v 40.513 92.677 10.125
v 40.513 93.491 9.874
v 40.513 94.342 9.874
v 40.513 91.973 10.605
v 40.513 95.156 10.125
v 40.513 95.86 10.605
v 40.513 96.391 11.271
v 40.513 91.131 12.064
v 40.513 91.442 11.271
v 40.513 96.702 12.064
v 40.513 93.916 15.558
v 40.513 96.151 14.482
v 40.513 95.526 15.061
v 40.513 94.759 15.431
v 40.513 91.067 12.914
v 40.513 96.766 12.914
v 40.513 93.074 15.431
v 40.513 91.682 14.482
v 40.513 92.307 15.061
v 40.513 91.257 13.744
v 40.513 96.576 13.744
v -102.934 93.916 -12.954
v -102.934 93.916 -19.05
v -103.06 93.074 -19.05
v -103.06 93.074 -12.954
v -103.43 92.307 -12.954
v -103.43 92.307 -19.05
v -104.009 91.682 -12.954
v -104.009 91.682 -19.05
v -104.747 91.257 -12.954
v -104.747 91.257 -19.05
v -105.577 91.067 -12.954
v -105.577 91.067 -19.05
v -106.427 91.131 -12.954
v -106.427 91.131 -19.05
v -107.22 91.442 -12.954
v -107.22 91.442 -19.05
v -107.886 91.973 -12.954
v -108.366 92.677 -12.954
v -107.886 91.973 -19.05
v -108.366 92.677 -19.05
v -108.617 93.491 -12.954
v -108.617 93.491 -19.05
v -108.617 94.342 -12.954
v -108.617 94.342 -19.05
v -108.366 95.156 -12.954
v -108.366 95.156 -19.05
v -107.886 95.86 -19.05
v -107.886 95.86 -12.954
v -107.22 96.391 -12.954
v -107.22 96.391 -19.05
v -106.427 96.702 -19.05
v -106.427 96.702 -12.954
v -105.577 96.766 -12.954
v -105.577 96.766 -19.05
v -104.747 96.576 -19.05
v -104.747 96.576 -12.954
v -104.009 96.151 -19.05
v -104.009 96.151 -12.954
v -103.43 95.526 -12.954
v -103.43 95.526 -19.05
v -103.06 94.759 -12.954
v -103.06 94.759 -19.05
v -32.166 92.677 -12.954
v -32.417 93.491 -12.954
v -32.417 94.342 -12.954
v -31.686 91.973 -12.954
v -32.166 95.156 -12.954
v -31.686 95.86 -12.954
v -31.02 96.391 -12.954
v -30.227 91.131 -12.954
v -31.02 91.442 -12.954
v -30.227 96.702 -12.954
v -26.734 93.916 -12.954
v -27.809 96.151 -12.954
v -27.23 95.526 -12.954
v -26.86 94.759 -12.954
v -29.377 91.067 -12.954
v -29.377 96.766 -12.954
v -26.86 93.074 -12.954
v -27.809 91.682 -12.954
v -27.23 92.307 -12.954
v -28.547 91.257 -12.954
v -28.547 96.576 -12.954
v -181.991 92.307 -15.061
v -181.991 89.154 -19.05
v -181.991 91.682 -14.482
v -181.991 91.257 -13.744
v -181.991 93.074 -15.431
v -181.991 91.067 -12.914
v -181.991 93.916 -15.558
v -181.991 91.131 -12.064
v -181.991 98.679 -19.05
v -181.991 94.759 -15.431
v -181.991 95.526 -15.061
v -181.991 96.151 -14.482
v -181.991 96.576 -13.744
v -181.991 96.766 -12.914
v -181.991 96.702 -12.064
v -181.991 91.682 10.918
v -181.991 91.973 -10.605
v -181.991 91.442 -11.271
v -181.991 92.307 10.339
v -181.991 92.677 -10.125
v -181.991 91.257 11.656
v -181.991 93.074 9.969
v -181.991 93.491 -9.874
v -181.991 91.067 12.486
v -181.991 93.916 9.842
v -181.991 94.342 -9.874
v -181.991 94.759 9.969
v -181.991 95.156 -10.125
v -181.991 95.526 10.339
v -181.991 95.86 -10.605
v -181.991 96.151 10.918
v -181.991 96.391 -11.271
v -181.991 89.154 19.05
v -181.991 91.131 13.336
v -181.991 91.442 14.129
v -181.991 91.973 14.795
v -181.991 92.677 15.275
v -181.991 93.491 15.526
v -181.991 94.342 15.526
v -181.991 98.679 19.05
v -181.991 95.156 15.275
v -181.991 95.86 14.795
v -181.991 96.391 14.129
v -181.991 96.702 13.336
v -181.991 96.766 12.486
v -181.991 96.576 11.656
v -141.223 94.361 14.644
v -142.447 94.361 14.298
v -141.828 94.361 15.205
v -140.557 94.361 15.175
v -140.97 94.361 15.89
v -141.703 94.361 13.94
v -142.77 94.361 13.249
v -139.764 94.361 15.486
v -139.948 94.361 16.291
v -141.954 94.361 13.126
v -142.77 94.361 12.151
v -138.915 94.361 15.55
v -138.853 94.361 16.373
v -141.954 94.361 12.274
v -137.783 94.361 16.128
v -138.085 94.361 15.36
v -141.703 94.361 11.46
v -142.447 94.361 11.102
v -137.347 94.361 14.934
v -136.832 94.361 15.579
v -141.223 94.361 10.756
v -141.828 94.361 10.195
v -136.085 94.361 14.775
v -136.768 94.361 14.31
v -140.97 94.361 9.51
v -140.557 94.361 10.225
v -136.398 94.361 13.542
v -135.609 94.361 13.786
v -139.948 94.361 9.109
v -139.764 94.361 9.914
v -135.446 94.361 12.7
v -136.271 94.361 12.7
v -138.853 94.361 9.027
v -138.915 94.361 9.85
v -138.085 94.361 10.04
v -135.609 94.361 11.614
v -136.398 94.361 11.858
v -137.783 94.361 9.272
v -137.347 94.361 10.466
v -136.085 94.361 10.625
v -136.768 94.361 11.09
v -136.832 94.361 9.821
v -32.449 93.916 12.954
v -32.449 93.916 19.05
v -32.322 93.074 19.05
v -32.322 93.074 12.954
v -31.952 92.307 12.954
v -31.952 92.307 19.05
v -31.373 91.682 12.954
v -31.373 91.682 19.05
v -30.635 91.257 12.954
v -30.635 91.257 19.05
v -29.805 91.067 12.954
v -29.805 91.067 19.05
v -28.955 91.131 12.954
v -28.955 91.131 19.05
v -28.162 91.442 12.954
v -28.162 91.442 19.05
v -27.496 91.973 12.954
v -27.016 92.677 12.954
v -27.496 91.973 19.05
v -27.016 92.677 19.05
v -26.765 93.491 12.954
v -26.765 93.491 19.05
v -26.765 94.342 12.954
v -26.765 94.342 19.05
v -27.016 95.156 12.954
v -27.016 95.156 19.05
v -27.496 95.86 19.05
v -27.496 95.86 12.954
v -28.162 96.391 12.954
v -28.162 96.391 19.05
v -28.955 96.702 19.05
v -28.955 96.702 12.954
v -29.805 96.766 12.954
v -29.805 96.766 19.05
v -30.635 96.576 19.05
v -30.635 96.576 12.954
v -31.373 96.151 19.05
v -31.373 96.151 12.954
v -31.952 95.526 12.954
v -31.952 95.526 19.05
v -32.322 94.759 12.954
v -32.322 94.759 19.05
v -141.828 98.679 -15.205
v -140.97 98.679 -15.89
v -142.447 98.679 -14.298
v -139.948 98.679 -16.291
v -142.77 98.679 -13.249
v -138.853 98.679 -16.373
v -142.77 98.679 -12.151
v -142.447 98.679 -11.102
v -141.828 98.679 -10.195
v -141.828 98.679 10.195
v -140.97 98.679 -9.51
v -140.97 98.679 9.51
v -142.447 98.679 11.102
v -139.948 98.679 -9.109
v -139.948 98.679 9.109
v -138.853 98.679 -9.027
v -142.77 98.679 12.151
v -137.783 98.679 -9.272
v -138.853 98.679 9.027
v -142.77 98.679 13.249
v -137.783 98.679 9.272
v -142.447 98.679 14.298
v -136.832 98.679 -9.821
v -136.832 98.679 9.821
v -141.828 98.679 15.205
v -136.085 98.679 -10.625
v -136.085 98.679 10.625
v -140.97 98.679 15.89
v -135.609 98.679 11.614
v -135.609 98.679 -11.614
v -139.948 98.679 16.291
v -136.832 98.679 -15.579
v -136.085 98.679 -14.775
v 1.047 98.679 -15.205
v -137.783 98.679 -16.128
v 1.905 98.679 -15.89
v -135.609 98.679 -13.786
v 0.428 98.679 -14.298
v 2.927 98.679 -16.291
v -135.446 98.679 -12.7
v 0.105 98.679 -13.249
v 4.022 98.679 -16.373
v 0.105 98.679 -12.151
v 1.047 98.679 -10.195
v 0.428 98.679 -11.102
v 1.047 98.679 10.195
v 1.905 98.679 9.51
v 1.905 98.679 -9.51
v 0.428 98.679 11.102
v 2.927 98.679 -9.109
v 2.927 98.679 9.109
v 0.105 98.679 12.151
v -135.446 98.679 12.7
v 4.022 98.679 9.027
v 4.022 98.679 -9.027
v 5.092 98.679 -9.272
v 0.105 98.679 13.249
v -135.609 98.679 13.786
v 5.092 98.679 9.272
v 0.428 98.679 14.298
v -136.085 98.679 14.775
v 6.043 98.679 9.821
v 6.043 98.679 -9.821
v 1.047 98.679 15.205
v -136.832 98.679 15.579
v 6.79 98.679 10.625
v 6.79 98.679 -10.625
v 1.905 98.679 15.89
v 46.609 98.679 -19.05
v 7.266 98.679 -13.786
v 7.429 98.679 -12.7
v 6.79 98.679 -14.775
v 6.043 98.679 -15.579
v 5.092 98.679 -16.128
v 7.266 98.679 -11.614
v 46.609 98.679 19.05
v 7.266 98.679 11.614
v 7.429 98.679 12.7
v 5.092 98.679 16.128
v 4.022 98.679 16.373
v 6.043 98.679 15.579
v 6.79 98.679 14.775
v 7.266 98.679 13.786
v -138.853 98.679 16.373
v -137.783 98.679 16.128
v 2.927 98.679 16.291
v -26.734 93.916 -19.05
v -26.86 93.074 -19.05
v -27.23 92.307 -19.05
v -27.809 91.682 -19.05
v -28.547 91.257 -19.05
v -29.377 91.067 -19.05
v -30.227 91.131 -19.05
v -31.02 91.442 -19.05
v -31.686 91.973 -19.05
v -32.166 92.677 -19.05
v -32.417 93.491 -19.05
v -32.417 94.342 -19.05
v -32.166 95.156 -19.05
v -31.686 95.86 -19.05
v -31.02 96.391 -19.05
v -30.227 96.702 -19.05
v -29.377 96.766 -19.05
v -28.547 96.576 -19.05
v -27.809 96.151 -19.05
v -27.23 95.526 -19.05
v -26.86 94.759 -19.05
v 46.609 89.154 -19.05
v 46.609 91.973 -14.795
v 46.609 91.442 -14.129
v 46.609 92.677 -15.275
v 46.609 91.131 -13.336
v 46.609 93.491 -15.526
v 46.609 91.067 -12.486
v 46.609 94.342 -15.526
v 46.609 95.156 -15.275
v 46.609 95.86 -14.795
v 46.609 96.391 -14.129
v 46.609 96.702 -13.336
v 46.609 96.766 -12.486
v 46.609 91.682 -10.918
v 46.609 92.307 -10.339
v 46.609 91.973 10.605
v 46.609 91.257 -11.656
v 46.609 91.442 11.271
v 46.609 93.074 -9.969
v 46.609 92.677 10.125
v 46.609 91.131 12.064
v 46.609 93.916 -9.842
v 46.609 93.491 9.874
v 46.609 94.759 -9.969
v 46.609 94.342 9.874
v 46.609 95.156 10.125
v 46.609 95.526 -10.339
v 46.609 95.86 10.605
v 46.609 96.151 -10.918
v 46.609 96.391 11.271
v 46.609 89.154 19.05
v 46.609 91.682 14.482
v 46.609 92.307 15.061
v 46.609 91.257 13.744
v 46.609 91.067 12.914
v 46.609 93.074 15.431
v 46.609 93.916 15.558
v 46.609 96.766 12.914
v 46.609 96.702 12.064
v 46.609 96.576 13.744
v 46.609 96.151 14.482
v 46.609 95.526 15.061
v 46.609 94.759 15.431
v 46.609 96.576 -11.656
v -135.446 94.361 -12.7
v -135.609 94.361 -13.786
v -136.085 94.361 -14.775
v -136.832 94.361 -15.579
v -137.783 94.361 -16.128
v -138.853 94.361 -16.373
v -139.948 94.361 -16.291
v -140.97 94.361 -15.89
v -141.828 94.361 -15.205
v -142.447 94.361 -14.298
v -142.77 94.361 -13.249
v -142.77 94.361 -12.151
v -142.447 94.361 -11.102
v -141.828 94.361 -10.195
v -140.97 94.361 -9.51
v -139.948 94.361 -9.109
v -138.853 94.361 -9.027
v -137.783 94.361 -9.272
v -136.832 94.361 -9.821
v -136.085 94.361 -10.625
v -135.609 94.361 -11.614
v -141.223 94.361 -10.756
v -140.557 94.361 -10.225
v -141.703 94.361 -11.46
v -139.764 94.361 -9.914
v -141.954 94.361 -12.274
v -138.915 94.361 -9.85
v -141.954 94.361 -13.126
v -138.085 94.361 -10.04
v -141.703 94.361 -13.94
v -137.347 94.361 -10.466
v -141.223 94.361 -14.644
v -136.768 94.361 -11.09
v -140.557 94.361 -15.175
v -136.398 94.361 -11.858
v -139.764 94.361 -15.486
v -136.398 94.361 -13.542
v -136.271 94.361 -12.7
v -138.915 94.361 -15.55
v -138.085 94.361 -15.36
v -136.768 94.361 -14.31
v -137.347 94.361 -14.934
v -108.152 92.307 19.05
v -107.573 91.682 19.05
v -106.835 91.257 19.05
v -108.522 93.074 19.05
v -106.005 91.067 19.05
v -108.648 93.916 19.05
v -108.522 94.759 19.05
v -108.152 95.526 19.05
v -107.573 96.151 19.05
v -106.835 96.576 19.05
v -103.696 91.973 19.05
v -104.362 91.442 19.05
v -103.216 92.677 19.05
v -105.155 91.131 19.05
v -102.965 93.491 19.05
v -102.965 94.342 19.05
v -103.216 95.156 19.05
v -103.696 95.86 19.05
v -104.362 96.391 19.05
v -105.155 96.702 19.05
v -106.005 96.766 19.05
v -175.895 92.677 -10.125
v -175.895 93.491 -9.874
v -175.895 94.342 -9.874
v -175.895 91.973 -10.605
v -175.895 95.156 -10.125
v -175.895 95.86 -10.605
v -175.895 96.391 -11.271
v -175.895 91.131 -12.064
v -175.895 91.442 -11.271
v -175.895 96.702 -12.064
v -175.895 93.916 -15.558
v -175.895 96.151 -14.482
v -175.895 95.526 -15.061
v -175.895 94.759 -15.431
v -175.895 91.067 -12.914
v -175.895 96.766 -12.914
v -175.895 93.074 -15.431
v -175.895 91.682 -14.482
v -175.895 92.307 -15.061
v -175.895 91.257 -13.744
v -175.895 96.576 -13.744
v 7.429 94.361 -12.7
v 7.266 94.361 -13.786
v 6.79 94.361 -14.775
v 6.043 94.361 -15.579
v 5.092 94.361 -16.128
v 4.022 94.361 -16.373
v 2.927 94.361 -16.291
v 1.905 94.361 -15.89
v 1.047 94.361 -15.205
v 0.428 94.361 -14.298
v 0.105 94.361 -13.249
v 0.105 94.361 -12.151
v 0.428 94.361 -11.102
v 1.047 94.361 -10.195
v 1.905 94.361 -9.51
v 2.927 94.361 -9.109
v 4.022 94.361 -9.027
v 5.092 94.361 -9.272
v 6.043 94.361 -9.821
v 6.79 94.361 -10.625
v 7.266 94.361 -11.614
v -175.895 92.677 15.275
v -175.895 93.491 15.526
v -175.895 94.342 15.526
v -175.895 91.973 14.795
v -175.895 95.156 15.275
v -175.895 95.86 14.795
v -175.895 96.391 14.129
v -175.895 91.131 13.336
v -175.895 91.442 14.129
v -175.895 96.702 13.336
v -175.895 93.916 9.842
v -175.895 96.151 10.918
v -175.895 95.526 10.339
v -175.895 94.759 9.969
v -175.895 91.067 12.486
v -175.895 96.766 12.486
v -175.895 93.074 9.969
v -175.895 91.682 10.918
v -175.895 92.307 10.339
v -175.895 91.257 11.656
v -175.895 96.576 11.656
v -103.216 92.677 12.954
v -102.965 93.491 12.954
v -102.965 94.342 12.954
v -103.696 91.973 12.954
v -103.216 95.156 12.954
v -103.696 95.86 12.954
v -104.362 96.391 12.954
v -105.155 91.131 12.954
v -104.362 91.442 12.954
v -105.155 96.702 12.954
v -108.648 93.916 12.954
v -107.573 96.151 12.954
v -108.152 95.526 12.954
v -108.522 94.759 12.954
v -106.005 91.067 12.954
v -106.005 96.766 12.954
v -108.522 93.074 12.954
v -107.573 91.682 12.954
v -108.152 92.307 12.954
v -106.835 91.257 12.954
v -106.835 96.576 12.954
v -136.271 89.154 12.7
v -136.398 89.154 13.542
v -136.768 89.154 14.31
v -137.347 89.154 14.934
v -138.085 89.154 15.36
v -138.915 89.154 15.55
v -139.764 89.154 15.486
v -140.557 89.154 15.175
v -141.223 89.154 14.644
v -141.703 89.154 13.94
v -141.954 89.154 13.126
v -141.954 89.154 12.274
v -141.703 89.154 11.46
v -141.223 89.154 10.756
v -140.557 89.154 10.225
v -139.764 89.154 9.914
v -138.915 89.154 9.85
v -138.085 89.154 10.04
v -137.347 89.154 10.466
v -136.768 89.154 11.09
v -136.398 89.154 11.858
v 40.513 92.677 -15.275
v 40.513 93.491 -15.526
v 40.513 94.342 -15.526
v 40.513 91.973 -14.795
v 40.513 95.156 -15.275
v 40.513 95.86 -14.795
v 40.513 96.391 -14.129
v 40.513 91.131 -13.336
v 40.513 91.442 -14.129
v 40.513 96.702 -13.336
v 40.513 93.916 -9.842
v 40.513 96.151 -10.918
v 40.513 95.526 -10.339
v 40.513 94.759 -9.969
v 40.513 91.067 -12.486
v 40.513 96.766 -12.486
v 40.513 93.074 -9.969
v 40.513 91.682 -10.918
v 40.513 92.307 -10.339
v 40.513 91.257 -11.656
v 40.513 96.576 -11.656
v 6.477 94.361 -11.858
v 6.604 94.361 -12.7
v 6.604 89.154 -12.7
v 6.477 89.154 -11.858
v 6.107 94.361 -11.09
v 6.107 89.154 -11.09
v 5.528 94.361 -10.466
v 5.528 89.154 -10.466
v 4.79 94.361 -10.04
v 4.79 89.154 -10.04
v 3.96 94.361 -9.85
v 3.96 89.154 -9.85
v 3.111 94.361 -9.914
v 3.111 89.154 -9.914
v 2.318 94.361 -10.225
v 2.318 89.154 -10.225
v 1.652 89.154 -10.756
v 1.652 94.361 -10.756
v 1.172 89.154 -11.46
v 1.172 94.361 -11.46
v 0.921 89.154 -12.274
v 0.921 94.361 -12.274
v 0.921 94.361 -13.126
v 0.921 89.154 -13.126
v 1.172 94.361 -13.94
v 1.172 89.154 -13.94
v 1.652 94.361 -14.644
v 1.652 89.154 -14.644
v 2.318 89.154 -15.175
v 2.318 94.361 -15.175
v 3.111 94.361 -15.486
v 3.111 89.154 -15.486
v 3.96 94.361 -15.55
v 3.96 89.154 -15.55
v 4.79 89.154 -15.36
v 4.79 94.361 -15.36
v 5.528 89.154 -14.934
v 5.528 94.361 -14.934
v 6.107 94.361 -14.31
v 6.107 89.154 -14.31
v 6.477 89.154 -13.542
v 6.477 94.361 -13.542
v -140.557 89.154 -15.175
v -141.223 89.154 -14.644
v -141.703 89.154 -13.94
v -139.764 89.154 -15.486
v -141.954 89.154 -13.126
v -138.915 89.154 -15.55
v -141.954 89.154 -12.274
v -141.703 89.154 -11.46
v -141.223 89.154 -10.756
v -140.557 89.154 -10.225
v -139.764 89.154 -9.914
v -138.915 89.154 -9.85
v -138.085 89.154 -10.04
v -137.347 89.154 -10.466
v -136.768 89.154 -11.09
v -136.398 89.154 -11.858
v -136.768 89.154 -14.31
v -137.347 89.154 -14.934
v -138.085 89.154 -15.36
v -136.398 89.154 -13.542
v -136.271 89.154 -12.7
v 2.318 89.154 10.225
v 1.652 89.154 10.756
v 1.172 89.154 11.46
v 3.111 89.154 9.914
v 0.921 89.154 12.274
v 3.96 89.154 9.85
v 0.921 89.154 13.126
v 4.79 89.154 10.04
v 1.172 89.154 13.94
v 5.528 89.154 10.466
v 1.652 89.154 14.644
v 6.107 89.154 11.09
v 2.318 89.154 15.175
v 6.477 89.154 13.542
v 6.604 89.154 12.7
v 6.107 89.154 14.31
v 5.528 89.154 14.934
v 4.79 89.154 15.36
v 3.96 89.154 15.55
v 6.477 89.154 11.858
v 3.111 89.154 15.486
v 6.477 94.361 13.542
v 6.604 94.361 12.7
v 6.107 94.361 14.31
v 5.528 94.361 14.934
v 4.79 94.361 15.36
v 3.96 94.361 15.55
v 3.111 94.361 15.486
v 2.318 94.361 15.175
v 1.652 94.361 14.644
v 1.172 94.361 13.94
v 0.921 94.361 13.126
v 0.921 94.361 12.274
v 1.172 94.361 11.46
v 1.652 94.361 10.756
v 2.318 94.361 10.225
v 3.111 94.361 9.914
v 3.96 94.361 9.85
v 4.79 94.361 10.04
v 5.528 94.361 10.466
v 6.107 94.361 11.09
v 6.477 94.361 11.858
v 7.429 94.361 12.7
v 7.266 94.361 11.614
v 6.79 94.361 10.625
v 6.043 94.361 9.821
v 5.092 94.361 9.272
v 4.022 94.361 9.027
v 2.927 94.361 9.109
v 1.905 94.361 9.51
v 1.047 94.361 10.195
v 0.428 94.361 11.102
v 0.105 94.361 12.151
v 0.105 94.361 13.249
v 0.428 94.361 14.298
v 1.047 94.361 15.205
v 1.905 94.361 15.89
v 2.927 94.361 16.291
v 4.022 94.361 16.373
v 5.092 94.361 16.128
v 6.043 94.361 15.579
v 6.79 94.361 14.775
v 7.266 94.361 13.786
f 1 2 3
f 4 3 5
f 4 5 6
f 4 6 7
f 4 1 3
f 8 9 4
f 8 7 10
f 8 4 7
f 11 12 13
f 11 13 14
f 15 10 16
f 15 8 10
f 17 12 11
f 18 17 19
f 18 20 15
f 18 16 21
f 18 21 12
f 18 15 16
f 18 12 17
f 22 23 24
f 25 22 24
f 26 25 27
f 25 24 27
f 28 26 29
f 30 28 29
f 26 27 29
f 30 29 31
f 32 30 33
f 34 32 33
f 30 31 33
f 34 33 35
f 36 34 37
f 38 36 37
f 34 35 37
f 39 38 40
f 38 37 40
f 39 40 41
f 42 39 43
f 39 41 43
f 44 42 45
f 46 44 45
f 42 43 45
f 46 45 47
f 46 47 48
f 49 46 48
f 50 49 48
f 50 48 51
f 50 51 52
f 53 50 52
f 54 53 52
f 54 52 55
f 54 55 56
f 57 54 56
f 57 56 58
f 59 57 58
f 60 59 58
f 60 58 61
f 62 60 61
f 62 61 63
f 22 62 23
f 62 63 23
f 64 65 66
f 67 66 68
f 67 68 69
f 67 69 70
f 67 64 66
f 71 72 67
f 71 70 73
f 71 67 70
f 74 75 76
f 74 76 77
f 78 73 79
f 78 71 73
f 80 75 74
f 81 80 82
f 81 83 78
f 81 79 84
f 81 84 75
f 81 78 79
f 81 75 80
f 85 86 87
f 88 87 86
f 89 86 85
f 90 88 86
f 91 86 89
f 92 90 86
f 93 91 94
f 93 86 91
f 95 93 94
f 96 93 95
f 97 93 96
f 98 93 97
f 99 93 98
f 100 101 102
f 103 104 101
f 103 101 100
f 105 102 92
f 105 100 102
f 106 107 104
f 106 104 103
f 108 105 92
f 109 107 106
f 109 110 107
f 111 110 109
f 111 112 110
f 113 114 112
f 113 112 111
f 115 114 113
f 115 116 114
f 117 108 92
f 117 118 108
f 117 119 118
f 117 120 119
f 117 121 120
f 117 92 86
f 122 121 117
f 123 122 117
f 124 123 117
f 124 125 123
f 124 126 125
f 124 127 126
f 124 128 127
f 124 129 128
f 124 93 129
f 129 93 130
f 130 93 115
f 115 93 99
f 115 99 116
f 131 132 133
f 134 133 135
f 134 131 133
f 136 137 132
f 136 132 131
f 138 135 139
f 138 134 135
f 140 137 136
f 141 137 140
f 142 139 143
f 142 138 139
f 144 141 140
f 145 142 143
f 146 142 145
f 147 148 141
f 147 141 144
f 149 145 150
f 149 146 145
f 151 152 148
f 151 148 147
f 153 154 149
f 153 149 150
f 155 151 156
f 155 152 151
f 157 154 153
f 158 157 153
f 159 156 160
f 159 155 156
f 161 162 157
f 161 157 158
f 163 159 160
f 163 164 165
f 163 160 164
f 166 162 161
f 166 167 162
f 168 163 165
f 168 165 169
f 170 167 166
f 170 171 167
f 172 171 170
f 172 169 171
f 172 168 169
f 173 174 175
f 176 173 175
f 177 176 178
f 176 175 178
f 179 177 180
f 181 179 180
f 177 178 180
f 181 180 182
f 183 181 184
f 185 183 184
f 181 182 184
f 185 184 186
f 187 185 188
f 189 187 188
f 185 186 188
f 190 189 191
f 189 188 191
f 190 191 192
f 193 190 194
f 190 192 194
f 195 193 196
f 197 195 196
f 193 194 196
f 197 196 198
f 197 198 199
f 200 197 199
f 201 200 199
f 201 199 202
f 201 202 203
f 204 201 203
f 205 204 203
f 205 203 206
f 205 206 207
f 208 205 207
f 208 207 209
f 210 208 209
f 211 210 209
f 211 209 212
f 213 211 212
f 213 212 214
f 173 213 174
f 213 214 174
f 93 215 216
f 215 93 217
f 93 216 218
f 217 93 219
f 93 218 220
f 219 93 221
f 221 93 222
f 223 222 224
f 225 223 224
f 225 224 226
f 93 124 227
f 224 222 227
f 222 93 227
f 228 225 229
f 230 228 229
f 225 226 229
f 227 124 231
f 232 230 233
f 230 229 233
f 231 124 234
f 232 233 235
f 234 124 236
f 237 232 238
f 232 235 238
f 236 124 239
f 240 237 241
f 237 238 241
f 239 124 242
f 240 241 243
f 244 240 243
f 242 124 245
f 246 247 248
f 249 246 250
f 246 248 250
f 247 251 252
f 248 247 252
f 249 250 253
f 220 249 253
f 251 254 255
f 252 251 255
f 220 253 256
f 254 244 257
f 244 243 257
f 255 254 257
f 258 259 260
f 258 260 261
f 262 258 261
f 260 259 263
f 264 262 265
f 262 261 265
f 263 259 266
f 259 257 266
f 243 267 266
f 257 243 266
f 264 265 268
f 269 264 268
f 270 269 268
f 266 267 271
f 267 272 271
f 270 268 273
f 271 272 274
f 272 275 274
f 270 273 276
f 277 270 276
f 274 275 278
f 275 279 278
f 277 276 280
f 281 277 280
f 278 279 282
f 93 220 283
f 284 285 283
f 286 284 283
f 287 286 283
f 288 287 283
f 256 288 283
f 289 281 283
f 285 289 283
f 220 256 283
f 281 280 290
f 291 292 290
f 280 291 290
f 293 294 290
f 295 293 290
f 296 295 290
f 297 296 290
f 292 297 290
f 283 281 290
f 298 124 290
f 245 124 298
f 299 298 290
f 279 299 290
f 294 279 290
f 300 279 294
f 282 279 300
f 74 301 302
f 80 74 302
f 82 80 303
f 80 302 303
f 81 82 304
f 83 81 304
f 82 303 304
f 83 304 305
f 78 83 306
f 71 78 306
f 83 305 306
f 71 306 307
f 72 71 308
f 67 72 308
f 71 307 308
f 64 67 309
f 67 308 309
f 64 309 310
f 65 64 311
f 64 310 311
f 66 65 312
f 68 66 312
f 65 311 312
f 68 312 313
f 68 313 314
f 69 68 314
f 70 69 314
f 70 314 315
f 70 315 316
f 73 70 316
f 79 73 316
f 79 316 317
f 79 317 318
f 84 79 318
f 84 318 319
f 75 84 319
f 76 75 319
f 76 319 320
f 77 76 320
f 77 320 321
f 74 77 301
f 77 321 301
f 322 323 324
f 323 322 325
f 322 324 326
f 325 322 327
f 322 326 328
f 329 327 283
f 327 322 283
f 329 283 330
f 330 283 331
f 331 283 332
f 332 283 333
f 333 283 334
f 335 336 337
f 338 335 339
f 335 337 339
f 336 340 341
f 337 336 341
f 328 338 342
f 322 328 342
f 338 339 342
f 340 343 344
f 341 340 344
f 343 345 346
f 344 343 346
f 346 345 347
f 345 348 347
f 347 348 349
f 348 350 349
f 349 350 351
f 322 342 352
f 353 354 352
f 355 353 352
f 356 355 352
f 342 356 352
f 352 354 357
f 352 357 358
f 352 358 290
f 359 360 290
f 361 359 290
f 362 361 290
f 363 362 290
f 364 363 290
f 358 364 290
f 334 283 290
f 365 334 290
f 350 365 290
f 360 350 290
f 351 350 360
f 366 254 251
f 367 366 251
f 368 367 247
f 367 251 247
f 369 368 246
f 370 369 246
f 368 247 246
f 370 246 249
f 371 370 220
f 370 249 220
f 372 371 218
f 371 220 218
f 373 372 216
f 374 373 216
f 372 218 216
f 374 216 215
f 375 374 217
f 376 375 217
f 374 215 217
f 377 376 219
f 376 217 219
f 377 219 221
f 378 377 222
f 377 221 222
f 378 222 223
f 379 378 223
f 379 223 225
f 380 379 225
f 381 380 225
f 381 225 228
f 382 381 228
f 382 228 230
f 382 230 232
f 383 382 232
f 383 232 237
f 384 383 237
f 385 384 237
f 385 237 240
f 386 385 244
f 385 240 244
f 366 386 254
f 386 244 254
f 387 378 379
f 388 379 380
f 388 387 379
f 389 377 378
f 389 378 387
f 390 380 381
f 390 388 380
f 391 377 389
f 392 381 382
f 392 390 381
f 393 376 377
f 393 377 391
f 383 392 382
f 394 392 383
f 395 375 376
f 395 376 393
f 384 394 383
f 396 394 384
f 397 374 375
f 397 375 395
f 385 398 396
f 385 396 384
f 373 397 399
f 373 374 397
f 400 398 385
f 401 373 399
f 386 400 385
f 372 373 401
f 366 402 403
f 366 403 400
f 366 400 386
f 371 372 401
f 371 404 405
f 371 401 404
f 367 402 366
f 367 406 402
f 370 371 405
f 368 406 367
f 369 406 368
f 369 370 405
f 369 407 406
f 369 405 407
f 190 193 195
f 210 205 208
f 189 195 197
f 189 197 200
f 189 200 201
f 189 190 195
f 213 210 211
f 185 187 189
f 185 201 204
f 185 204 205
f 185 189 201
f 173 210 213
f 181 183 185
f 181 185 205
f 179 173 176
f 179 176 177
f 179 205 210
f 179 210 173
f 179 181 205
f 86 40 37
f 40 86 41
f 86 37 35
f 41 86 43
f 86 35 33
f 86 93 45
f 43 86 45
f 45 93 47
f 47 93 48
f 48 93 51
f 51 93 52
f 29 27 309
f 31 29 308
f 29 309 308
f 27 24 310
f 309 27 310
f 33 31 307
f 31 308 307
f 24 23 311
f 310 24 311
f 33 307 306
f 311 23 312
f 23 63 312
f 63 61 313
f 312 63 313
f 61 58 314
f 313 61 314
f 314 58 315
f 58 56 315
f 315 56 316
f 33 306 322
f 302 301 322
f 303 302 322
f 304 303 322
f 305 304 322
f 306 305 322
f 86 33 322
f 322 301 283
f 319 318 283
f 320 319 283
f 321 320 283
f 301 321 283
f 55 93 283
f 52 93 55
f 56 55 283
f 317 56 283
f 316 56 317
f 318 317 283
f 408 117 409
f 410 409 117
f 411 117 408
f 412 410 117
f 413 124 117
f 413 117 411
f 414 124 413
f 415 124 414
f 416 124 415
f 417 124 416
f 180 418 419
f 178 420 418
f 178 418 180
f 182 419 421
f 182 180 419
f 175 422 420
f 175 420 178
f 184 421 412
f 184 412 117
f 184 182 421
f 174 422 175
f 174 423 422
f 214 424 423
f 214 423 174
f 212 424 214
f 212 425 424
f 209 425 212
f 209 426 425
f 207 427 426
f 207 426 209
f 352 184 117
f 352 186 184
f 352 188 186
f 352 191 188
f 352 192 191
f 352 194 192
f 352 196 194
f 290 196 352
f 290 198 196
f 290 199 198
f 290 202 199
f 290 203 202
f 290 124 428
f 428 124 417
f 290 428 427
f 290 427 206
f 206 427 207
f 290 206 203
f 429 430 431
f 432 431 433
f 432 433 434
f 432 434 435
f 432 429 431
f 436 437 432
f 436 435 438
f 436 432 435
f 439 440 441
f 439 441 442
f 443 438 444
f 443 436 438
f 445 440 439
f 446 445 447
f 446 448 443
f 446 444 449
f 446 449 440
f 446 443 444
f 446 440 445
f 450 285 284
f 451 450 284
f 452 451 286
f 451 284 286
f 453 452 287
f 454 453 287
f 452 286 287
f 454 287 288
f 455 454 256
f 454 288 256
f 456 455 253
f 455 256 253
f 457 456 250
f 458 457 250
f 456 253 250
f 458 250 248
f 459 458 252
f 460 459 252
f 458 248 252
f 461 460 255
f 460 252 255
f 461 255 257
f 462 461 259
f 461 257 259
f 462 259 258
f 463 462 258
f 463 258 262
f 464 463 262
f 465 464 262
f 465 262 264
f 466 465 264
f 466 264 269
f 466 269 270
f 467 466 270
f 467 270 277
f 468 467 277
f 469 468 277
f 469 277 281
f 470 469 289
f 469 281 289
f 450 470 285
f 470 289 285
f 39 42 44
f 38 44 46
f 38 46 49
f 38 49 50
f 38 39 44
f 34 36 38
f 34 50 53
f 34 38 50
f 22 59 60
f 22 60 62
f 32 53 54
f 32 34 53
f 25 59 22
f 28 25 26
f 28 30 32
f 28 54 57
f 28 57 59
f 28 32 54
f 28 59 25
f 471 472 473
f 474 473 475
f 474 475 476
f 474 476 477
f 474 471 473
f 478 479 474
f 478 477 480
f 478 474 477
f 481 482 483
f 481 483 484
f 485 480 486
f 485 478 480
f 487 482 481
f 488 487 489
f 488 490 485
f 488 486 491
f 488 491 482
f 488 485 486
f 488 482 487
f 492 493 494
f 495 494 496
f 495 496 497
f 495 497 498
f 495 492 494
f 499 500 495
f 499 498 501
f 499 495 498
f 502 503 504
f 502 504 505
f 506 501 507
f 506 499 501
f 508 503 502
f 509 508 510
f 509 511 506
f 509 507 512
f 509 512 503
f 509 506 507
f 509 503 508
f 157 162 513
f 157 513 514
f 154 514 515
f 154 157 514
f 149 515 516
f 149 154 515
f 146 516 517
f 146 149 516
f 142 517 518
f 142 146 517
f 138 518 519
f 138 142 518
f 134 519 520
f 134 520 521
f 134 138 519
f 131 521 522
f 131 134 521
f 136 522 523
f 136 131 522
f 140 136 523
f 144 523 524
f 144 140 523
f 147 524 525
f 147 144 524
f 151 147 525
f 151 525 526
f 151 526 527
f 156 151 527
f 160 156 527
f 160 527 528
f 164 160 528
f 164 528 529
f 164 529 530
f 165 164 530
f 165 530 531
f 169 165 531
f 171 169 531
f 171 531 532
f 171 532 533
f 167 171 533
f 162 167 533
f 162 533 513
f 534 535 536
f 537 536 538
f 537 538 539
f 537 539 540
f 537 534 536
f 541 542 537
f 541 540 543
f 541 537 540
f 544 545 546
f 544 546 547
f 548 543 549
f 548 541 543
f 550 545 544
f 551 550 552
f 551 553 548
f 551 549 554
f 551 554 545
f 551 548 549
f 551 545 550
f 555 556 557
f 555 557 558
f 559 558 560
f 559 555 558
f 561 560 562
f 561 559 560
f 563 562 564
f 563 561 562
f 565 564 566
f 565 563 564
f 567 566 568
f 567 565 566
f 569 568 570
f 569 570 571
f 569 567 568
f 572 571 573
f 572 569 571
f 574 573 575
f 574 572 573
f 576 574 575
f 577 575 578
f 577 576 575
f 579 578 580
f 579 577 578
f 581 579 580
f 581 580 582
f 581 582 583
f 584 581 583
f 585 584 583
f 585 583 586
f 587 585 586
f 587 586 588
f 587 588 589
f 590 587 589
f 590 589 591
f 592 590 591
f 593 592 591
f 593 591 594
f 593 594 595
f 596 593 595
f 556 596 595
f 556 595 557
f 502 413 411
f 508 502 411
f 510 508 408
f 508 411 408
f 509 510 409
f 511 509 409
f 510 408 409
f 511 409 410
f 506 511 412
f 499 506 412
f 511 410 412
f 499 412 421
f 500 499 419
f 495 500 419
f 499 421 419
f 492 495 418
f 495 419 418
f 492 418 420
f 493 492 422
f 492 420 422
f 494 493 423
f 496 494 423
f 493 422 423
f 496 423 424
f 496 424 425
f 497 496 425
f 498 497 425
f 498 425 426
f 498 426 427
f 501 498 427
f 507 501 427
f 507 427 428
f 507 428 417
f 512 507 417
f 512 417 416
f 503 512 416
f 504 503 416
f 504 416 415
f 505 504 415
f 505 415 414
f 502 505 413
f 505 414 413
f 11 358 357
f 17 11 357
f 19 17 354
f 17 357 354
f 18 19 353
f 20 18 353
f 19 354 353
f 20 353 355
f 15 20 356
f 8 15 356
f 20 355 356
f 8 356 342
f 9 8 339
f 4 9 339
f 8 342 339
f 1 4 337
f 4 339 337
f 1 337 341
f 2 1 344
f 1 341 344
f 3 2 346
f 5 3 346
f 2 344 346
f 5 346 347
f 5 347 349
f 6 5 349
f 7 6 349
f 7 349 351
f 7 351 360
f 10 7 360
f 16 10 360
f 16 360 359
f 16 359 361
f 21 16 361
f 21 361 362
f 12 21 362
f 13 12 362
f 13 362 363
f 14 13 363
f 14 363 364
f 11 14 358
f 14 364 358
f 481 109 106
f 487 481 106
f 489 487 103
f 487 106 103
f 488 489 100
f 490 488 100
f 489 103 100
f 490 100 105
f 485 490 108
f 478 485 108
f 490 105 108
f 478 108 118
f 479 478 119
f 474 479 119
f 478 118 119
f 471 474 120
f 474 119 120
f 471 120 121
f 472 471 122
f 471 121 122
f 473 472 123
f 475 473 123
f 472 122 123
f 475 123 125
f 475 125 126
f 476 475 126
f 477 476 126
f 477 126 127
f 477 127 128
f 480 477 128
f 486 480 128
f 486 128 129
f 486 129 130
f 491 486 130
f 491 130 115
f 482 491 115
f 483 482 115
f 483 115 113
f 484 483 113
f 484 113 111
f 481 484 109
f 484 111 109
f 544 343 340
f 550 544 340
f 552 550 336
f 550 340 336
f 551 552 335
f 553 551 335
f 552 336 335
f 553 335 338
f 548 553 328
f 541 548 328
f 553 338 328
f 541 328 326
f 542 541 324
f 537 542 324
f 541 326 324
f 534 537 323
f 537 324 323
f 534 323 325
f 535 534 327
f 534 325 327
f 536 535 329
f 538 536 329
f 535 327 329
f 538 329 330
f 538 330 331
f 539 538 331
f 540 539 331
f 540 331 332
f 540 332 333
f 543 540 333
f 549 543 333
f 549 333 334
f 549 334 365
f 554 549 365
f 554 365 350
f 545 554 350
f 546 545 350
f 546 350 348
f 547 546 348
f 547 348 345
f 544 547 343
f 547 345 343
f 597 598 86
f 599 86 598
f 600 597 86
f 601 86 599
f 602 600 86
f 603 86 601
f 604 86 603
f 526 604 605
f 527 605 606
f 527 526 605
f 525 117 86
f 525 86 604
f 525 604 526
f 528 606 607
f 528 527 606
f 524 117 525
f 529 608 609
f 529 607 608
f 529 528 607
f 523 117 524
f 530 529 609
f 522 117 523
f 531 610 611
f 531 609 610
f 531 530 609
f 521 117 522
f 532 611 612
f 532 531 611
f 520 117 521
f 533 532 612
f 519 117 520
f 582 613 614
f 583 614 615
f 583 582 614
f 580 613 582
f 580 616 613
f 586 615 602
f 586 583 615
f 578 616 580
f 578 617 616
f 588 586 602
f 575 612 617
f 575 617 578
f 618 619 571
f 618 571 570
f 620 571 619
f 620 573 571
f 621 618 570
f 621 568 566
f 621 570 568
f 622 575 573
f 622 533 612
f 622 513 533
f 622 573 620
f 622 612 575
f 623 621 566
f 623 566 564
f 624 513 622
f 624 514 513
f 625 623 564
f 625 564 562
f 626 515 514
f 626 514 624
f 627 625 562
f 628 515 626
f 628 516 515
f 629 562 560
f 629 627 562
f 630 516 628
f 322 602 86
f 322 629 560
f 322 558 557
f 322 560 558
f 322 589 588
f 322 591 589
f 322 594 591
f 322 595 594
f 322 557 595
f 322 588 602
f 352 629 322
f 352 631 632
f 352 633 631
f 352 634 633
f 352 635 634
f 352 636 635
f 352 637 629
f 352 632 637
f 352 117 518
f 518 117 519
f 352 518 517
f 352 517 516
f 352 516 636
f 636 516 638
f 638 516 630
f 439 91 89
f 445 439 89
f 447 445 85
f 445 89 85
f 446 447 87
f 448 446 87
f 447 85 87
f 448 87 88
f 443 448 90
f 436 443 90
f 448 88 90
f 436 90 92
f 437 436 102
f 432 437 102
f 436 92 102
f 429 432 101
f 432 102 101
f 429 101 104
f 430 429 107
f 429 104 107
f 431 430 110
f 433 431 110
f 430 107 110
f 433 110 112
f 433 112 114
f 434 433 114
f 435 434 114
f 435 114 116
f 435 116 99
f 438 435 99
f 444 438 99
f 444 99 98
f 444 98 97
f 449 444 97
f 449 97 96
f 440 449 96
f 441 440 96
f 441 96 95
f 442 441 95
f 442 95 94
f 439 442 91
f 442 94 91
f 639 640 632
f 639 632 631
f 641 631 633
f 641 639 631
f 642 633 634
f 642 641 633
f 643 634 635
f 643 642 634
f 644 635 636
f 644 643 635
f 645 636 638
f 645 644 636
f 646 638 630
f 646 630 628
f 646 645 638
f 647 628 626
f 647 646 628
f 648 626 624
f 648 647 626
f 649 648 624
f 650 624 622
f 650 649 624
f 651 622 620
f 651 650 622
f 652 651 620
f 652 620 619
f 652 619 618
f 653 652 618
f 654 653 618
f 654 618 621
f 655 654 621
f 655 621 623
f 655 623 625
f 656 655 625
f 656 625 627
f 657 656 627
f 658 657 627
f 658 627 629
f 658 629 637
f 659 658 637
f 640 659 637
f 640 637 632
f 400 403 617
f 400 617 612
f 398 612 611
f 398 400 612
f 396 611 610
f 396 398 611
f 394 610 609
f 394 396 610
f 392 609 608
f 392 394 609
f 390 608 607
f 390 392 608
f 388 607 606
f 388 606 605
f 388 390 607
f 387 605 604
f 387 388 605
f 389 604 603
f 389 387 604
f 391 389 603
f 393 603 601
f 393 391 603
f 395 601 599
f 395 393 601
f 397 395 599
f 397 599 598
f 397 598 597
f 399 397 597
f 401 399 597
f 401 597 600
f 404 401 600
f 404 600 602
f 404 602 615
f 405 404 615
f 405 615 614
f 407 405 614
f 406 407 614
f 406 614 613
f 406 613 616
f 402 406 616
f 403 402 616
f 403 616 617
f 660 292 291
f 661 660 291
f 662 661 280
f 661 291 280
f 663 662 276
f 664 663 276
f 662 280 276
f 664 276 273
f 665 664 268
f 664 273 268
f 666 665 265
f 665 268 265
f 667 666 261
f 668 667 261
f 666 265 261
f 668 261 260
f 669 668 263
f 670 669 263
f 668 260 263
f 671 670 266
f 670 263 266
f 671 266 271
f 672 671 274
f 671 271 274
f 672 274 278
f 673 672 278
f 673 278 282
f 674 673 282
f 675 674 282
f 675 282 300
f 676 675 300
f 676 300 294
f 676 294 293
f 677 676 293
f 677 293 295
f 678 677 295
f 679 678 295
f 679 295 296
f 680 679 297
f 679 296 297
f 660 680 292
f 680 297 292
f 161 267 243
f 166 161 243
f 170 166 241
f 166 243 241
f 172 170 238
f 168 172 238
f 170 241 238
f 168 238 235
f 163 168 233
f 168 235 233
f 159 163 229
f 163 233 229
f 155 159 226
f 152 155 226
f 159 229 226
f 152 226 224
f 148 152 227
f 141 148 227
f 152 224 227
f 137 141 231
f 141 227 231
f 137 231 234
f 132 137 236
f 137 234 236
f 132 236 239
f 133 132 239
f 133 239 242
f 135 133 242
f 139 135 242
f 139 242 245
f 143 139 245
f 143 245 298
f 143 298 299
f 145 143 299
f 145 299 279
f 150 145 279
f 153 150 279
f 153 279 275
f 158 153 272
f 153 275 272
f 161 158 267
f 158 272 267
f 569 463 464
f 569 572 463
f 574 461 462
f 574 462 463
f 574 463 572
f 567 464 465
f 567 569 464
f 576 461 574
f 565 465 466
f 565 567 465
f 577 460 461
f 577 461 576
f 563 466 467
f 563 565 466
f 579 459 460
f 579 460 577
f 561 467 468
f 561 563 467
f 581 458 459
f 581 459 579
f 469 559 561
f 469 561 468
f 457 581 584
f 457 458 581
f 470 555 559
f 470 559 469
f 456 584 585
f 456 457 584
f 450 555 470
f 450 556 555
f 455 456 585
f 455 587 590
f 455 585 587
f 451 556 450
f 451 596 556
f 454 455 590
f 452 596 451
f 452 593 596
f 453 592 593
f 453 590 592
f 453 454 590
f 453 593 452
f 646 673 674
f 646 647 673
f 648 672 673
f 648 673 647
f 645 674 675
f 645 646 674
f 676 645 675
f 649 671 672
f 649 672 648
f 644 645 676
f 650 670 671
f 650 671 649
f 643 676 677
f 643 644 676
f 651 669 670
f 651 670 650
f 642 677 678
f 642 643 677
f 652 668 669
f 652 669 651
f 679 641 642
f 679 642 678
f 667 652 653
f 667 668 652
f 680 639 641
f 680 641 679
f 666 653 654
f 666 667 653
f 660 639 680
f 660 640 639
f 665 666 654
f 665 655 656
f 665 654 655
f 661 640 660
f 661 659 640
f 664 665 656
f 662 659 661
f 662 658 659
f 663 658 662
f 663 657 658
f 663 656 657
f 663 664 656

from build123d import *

# Parameters (mm, degrees)
SKETCH006_W     = 228.6
SKETCH006_H     = 38.1
SKETCH006_R     = 2.8575
PAD004_DEPTH    = 9.525
SKETCH077_R     = 3.683
POCKET006_DEPTH = 4.318
SKETCH083_R     = 2.8575
POCKET011_DEPTH = 6.096
SKETCH084_R     = 2.8575
POCKET012_DEPTH = 6.096
SKETCH088_R     = 2.8575
POCKET016_DEPTH = 6.096
SKETCH089_R     = 2.8575
POCKET017_DEPTH = 6.096


with BuildPart() as part:
    # Sketch006 → Pad004 (new body)
    with BuildSketch(Plane.XZ):
        Rectangle(SKETCH006_W, SKETCH006_H)
        with Locations((-71.4375, 12.7)):
            Circle(SKETCH006_R, mode=Mode.SUBTRACT)
        with Locations((-71.4375, -12.7)):
            Circle(SKETCH006_R, mode=Mode.SUBTRACT)
        with Locations((71.4375, -12.7)):
            Circle(SKETCH006_R, mode=Mode.SUBTRACT)
        with Locations((71.4375, 12.7)):
            Circle(SKETCH006_R, mode=Mode.SUBTRACT)
    extrude(amount=PAD004_DEPTH)

    # Sketch077 (on Face9 of Pad004) → Pocket006 (cut)
    with BuildSketch(Plane(origin=(0, 0, 0), x_dir=(1, 0, 0), z_dir=(0, 1, 0))):
        with Locations((71.4375, 12.7)):
            Circle(SKETCH077_R)
        with Locations((71.4375, -12.7)):
            Circle(SKETCH077_R)
        with Locations((-71.4375, -12.7)):
            Circle(SKETCH077_R)
        with Locations((-71.4375, 12.7)):
            Circle(SKETCH077_R)
    extrude(amount=-POCKET006_DEPTH, mode=Mode.SUBTRACT)

    # Sketch083 (on Face6 of Pocket006) → Pocket011 (cut)
    with BuildSketch(Plane(origin=(114.3, 0, 0), x_dir=(0, 0, 1), z_dir=(1, 0, 0))):
        with Locations((-12.7, 4.7625)):
            Circle(SKETCH083_R)
        with Locations((12.7, 4.7625)):
            Circle(SKETCH083_R)
    extrude(amount=-POCKET011_DEPTH, mode=Mode.SUBTRACT)

    # Sketch084 (on Face1 of Pocket006) → Pocket012 (cut)
    with BuildSketch(Plane(origin=(-114.3, 0, 0), x_dir=(0, 0, -1), z_dir=(-1, 0, 0))):
        with Locations((-12.7, 4.7625)):
            Circle(SKETCH084_R)
        with Locations((12.7, 4.7625)):
            Circle(SKETCH084_R)
    extrude(amount=-POCKET012_DEPTH, mode=Mode.SUBTRACT)

    # Sketch088 (on Face2 of Pocket012) → Pocket016 (cut)
    with BuildSketch(Plane(origin=(0, 0, 19.05), x_dir=(-1, 0, 0), z_dir=(0, 0, 1))):
        with Locations((-38.1, 4.7625)):
            Circle(SKETCH088_R)
        with Locations((38.1, 4.7625)):
            Circle(SKETCH088_R)
    extrude(amount=-POCKET016_DEPTH, mode=Mode.SUBTRACT)

    # Sketch089 (on Face5 of Pocket016) → Pocket017 (cut)
    with BuildSketch(Plane(origin=(0, 0, -19.05), x_dir=(1, 0, 0), z_dir=(0, 0, -1))):
        with Locations((38.1, 4.7625)):
            Circle(SKETCH089_R)
        with Locations((-38.1, 4.7625)):
            Circle(SKETCH089_R)
    extrude(amount=-POCKET017_DEPTH, mode=Mode.SUBTRACT)


with BuildPart() as part_1:
    # Body004 placement: moved
    add(part.part.moved(Location((-67.691, 98.679, 0))))


solid = part_1.part
